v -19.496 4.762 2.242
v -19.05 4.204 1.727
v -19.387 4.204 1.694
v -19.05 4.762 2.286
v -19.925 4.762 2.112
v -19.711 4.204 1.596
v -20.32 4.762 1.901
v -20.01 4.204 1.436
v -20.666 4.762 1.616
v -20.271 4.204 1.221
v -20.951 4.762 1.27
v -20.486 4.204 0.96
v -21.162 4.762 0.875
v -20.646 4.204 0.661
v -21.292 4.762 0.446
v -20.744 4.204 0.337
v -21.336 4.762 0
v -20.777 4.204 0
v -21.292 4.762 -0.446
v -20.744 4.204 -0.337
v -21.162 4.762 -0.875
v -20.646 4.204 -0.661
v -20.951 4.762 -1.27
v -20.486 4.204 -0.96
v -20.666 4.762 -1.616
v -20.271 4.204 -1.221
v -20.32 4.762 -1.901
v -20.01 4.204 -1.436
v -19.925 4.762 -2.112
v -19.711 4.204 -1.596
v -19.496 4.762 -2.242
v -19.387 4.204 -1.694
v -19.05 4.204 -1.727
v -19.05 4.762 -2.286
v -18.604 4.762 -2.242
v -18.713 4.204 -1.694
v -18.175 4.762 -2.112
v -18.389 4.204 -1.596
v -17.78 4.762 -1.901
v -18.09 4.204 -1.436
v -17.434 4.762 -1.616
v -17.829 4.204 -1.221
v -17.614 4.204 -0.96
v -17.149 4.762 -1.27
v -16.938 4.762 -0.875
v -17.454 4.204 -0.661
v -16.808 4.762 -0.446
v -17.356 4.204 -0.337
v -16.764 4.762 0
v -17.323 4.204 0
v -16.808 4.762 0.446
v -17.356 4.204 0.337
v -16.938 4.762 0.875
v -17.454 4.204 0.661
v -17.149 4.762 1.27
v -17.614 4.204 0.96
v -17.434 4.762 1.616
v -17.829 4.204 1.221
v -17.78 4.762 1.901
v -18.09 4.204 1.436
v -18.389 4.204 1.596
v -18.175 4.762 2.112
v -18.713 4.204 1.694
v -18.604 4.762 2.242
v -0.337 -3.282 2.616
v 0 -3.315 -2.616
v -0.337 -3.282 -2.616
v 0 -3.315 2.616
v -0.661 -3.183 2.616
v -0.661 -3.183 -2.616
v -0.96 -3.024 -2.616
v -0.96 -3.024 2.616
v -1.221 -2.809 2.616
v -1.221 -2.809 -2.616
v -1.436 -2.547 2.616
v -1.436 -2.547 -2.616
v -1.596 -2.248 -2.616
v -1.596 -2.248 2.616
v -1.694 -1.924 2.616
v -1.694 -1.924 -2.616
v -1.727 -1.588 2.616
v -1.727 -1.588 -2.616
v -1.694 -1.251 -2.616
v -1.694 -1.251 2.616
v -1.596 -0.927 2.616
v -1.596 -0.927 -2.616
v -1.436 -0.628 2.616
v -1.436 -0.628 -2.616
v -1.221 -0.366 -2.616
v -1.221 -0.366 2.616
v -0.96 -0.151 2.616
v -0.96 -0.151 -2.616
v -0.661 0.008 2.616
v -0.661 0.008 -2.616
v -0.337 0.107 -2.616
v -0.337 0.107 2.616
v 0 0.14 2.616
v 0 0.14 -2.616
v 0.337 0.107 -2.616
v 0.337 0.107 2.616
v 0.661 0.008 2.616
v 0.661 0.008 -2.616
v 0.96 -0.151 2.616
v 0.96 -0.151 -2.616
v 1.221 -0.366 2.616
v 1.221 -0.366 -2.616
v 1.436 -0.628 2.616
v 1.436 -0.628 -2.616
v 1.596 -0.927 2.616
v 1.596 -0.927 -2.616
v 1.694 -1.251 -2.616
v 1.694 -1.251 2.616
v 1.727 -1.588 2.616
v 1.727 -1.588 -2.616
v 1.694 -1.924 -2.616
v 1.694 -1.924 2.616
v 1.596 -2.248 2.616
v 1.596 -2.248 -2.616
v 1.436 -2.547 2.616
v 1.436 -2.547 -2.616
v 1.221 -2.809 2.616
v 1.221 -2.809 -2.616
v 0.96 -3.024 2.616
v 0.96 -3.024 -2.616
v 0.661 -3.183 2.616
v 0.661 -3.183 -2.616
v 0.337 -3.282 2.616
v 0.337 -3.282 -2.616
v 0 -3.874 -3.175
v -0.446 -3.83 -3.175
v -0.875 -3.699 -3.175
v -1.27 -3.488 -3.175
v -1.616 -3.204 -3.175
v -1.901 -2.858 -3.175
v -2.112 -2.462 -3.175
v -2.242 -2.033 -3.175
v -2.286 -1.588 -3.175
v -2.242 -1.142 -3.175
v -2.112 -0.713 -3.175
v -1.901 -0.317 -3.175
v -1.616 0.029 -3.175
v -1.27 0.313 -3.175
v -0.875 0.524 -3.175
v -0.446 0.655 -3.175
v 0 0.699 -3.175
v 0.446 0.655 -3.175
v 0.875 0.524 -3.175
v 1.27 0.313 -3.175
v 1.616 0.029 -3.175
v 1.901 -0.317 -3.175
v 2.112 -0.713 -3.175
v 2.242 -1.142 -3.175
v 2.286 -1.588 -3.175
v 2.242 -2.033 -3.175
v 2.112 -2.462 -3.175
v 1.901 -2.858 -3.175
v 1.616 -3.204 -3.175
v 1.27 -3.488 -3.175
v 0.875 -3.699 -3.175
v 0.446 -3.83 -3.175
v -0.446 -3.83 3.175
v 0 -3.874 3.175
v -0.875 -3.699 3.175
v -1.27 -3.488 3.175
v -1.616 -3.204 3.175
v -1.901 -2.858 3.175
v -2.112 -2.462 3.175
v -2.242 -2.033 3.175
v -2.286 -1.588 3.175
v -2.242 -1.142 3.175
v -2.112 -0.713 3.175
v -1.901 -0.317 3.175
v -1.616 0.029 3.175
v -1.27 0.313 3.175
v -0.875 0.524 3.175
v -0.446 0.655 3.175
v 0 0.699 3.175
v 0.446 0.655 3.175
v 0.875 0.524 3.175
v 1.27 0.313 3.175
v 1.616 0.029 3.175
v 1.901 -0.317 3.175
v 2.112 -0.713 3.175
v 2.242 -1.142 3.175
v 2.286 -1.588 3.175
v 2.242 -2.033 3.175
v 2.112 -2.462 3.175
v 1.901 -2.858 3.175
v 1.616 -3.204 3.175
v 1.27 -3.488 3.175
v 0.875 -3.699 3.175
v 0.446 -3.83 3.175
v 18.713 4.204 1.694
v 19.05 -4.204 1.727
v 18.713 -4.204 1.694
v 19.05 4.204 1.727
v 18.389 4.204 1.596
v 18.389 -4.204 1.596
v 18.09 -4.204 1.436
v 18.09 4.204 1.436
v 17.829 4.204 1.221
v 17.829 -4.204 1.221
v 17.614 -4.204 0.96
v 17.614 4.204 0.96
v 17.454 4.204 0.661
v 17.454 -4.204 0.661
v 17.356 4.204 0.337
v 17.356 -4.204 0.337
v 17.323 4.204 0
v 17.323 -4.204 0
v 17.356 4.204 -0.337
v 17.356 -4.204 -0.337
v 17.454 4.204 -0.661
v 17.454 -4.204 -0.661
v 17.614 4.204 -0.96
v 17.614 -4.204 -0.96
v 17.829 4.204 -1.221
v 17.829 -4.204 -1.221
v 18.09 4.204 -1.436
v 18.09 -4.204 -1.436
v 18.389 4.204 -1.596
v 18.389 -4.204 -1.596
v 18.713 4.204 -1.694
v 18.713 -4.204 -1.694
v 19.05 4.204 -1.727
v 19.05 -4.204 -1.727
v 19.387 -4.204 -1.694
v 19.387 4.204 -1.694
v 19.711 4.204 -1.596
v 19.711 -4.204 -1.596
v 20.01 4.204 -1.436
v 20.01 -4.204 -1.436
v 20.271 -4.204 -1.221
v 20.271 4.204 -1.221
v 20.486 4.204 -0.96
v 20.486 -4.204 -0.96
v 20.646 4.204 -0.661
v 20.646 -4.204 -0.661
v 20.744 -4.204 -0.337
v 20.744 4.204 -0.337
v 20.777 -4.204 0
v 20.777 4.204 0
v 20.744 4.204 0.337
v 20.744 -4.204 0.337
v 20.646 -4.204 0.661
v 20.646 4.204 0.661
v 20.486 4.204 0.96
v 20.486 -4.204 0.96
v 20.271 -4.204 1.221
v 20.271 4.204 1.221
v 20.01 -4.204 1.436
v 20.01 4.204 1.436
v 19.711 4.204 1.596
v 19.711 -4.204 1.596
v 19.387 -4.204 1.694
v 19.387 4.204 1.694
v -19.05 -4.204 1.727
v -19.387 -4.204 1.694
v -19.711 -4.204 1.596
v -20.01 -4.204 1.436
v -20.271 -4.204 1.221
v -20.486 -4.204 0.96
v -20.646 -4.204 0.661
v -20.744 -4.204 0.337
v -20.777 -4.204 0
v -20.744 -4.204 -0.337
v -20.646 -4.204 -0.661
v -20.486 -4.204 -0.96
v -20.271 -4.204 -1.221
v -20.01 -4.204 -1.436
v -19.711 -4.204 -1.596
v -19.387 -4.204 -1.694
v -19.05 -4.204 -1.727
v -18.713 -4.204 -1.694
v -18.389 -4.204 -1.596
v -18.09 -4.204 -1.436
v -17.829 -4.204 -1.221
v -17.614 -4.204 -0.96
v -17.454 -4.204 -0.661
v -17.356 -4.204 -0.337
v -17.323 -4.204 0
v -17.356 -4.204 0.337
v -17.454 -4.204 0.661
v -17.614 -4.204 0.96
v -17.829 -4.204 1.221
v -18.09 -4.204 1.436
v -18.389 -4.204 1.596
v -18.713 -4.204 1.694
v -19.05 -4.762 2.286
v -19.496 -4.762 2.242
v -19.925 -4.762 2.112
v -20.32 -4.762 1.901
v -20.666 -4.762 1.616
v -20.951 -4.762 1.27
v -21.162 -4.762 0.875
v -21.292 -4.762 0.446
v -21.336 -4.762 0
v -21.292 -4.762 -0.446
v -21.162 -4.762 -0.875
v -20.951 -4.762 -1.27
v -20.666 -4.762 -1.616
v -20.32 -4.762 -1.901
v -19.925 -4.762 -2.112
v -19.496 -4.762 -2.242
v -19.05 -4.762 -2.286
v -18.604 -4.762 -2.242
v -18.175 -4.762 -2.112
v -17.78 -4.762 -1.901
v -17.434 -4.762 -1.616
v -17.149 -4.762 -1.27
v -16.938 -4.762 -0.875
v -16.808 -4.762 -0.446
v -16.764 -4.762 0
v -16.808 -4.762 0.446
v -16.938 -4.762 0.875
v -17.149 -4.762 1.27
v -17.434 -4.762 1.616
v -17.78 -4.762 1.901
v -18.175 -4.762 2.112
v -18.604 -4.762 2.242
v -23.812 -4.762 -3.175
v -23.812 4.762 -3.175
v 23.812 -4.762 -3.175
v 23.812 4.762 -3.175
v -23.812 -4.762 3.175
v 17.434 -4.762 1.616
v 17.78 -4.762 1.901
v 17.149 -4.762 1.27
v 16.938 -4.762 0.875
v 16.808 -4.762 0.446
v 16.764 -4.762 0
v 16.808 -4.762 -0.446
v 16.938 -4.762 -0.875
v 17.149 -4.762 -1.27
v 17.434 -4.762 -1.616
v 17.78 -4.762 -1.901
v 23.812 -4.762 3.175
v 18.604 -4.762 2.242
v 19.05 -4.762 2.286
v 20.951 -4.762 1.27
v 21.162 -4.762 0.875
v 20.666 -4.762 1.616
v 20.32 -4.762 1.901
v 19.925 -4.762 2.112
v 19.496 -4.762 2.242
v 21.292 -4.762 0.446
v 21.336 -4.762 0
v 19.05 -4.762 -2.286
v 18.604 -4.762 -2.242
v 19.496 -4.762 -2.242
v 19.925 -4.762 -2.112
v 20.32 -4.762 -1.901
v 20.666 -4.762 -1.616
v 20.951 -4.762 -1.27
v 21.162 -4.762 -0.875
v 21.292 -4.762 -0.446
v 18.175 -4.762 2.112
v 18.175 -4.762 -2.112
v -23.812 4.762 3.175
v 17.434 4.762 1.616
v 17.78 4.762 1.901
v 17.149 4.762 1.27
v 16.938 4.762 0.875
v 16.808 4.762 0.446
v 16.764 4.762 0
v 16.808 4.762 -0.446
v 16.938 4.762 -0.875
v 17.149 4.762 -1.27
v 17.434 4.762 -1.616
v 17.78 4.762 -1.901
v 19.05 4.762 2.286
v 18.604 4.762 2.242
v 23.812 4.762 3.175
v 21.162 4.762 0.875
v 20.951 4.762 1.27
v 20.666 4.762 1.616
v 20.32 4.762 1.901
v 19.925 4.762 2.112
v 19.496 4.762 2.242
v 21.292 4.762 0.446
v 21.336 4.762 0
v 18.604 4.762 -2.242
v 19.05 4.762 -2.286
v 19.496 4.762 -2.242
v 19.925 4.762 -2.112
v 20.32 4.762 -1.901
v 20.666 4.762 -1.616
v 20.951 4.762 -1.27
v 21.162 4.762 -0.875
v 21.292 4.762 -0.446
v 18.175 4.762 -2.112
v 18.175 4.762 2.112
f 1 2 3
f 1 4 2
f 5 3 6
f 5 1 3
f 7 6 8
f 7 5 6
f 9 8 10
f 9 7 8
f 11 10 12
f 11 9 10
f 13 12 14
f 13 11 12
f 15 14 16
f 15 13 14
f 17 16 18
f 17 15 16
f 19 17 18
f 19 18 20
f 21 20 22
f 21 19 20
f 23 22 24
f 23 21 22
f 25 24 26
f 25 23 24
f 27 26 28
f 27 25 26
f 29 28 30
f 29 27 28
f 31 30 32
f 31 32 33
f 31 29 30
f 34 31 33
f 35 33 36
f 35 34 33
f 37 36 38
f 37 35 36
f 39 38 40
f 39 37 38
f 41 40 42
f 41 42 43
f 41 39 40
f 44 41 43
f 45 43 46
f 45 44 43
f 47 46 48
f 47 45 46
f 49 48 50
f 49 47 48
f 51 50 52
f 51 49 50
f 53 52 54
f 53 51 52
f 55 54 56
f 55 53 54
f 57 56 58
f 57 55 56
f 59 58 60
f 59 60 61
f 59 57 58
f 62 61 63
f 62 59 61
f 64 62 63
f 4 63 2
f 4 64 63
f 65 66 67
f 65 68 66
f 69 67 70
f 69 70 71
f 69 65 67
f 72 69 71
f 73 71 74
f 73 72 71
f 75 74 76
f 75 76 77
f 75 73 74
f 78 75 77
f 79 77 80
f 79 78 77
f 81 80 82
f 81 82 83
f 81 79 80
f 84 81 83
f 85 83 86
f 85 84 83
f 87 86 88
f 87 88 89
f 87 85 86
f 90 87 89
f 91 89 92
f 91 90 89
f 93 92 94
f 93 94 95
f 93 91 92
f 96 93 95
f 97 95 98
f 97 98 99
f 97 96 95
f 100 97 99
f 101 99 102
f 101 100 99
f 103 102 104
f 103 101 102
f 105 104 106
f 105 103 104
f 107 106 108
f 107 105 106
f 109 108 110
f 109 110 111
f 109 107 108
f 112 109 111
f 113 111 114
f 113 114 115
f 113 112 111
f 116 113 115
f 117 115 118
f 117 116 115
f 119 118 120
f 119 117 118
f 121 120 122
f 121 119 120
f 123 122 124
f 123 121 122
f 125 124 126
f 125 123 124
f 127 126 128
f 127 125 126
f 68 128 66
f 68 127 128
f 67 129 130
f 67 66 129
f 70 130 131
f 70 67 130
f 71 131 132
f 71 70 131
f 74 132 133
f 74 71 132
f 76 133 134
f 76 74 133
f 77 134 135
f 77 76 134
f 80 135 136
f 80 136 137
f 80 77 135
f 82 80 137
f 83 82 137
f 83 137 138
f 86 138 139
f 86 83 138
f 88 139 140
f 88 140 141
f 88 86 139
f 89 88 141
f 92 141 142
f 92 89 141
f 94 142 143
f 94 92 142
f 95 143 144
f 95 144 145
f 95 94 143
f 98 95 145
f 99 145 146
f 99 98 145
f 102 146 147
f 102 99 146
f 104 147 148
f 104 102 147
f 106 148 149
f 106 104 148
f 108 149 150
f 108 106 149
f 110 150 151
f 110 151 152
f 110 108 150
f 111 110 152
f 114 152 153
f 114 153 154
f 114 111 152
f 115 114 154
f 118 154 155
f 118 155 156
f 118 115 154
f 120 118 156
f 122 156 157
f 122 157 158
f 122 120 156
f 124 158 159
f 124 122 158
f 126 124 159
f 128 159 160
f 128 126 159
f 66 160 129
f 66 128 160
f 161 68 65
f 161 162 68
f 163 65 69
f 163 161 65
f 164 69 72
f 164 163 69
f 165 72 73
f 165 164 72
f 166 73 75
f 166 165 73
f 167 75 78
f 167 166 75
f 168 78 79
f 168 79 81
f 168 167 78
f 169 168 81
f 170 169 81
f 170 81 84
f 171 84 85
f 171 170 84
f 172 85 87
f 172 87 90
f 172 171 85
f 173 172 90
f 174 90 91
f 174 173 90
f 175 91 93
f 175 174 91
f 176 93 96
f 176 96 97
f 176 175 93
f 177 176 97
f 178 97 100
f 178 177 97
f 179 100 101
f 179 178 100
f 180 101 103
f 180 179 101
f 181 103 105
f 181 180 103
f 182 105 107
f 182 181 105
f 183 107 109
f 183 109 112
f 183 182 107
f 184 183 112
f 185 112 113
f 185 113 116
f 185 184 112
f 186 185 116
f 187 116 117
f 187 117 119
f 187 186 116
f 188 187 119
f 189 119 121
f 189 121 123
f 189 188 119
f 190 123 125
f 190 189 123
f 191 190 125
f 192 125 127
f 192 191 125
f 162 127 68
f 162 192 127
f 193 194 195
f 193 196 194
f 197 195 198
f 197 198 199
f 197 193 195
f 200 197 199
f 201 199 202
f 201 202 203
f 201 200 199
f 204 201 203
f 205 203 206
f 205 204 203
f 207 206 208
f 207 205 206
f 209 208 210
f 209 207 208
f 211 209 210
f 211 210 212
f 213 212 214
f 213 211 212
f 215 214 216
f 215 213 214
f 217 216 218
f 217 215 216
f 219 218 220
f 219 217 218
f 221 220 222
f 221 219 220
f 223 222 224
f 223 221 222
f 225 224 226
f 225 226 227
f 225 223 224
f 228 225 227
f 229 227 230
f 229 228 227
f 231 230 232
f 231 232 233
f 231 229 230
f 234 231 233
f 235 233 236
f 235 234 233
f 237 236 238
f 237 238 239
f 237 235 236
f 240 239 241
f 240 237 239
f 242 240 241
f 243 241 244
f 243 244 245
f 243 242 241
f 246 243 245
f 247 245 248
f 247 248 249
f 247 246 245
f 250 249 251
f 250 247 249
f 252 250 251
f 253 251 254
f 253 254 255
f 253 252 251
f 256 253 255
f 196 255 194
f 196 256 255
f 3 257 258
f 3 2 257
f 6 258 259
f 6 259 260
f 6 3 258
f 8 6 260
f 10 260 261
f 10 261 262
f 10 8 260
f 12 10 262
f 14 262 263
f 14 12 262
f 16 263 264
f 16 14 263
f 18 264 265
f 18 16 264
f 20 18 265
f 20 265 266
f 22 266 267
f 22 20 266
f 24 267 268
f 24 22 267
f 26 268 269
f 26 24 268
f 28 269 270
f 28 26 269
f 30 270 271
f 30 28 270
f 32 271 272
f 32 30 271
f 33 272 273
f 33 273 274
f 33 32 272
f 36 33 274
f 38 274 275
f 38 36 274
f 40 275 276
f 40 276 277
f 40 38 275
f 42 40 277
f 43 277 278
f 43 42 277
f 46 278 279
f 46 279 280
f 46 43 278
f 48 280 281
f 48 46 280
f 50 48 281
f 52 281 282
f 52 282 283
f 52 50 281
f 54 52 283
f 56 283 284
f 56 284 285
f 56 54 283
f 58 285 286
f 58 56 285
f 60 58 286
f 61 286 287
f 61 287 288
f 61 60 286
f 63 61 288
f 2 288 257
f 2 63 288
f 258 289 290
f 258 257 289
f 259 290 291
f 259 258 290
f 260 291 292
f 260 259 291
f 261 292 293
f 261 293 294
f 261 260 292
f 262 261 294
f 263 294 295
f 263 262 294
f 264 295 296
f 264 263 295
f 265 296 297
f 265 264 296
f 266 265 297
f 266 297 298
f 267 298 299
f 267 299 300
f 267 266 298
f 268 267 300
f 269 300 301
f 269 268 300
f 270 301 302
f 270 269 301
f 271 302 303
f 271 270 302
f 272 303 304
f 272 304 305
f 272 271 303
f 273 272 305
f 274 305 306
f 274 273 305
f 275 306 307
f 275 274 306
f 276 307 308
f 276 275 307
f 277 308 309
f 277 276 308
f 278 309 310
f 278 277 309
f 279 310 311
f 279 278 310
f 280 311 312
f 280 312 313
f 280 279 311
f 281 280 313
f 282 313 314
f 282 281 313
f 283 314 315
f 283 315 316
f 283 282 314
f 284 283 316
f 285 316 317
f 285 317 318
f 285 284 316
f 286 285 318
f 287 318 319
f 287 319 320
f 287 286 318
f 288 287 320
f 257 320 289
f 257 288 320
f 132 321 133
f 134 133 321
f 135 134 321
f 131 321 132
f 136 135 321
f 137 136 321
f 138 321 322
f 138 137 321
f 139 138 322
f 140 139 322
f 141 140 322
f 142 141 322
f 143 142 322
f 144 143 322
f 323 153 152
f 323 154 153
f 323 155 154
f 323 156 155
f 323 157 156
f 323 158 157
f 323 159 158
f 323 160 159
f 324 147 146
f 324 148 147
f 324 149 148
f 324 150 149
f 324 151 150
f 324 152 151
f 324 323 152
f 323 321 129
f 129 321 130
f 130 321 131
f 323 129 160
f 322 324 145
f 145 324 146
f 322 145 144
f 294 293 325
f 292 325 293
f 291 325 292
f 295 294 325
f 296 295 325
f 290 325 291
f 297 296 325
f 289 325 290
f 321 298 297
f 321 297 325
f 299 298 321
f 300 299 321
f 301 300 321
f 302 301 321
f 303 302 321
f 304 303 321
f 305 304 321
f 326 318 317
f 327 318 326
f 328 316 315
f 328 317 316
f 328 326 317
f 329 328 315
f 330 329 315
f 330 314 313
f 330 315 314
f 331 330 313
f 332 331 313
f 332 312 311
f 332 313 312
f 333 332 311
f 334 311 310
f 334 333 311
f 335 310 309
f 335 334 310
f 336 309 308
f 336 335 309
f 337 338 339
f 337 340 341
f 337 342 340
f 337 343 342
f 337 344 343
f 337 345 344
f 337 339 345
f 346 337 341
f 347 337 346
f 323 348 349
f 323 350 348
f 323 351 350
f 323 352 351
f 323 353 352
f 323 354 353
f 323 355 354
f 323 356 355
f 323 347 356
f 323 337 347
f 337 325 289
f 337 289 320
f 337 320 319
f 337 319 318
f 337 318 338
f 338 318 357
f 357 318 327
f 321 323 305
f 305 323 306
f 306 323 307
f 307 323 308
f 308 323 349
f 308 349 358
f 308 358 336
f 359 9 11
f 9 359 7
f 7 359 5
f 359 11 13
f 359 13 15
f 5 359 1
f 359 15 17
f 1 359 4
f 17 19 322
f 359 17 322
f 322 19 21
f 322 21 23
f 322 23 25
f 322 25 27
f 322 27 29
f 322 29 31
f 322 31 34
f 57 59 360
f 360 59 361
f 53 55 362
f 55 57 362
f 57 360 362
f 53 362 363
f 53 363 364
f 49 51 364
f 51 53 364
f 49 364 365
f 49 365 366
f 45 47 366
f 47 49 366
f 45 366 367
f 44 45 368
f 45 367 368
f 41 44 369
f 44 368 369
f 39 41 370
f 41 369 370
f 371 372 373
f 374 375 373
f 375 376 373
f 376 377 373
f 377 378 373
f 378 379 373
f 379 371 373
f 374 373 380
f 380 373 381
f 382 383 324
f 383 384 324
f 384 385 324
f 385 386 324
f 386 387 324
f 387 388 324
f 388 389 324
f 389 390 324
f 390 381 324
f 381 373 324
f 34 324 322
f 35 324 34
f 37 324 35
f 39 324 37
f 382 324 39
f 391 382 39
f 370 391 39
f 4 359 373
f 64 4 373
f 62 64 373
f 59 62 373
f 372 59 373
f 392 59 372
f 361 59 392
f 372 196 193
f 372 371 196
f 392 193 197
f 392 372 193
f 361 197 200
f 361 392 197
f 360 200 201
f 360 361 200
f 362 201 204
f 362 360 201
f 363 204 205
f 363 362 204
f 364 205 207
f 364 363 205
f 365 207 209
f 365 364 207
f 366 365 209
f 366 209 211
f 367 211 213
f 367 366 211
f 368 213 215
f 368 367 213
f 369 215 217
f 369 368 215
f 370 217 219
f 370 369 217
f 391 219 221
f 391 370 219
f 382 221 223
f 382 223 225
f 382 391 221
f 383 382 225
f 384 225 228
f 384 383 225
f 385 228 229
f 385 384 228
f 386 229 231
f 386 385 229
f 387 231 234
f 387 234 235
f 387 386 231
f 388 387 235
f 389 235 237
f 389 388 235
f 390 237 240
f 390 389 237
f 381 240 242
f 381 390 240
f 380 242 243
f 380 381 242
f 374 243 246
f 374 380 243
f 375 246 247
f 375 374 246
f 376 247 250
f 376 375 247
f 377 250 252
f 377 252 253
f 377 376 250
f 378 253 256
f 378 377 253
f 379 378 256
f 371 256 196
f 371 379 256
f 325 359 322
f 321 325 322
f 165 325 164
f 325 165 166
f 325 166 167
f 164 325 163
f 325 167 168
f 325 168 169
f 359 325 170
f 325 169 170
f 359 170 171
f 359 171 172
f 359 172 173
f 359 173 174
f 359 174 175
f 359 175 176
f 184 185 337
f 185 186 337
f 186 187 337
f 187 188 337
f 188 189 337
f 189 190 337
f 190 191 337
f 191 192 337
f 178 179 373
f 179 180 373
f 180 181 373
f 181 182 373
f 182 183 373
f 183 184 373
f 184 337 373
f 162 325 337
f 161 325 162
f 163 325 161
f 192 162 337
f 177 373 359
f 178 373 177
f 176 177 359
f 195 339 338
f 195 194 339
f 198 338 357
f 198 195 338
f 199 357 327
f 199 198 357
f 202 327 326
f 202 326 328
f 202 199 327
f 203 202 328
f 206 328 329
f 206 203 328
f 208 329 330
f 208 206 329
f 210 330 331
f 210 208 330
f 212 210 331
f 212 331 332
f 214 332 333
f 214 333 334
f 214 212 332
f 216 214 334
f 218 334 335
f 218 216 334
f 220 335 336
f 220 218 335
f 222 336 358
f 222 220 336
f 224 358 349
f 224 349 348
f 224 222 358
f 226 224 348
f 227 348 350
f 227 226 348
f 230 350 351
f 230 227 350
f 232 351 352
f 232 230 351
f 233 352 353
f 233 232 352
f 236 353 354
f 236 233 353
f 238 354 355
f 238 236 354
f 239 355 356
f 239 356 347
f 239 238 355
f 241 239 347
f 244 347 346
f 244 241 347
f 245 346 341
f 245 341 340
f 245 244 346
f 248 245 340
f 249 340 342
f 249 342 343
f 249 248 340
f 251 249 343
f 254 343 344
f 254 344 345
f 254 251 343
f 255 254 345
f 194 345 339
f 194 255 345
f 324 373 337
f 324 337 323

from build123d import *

# Parameters (mm, degrees)
SKETCH1_W                      = 6.35
SKETCH1_H                      = 9.525
BOSS_EXTRUDE1_DEPTH            = 23.8125
F_8_32_TAPPED_HOLE1_AT_2_COUNT = 2
F_8_32_TAPPED_HOLE1_AT_2_PITCH = 38.1


with BuildPart() as part:
    # Sketch1 → Boss-Extrude1 (new, symmetric)
    with BuildSketch(Plane(origin=(0, 0, 0), x_dir=(0, 0, -1), z_dir=(1, 0, 0))):
        Rectangle(SKETCH1_W, SKETCH1_H)
    extrude(amount=BOSS_EXTRUDE1_DEPTH, both=True)

    # Sketch2 → #8-32 Tapped Hole1 (revolve, cut)
    with BuildSketch(Plane(origin=(19.05, 4.7625, 0), x_dir=(0, 0, 1), z_dir=(1, 0, 0))):
        Polygon((0, 0), (0, 9.525), (2.286, 9.525), (1.7272, 8.9662), (1.7272, 0.5588), (2.286, 0), align=None)
    f_8_32_tapped_hole1 = revolve(axis=Axis((19.05, 11.1125, 0), (0, -1, 0)), mode=Mode.SUBTRACT)

    # #8-32 Tapped Hole1 at 2: #8-32 Tapped Hole1 ×2
    with Locations(*[(-i * F_8_32_TAPPED_HOLE1_AT_2_PITCH, 0, 0) for i in range(1, F_8_32_TAPPED_HOLE1_AT_2_COUNT)]):
        add(f_8_32_tapped_hole1, mode=Mode.SUBTRACT)

    # Sketch4 → #8-32 Tapped Hole2 (revolve, cut)
    with BuildSketch(Plane(origin=(0, -1.5875, 3.175), x_dir=(0, -1, 0), z_dir=(1, 0, 0))):
        Polygon((0, 0), (0, 6.35), (2.286, 6.35), (1.7272, 5.7912), (1.7272, 0.5588), (2.286, 0), align=None)
    revolve(axis=Axis((0, -1.5875, 9.525), (0, 0, -1)), mode=Mode.SUBTRACT)


solid = part.part
